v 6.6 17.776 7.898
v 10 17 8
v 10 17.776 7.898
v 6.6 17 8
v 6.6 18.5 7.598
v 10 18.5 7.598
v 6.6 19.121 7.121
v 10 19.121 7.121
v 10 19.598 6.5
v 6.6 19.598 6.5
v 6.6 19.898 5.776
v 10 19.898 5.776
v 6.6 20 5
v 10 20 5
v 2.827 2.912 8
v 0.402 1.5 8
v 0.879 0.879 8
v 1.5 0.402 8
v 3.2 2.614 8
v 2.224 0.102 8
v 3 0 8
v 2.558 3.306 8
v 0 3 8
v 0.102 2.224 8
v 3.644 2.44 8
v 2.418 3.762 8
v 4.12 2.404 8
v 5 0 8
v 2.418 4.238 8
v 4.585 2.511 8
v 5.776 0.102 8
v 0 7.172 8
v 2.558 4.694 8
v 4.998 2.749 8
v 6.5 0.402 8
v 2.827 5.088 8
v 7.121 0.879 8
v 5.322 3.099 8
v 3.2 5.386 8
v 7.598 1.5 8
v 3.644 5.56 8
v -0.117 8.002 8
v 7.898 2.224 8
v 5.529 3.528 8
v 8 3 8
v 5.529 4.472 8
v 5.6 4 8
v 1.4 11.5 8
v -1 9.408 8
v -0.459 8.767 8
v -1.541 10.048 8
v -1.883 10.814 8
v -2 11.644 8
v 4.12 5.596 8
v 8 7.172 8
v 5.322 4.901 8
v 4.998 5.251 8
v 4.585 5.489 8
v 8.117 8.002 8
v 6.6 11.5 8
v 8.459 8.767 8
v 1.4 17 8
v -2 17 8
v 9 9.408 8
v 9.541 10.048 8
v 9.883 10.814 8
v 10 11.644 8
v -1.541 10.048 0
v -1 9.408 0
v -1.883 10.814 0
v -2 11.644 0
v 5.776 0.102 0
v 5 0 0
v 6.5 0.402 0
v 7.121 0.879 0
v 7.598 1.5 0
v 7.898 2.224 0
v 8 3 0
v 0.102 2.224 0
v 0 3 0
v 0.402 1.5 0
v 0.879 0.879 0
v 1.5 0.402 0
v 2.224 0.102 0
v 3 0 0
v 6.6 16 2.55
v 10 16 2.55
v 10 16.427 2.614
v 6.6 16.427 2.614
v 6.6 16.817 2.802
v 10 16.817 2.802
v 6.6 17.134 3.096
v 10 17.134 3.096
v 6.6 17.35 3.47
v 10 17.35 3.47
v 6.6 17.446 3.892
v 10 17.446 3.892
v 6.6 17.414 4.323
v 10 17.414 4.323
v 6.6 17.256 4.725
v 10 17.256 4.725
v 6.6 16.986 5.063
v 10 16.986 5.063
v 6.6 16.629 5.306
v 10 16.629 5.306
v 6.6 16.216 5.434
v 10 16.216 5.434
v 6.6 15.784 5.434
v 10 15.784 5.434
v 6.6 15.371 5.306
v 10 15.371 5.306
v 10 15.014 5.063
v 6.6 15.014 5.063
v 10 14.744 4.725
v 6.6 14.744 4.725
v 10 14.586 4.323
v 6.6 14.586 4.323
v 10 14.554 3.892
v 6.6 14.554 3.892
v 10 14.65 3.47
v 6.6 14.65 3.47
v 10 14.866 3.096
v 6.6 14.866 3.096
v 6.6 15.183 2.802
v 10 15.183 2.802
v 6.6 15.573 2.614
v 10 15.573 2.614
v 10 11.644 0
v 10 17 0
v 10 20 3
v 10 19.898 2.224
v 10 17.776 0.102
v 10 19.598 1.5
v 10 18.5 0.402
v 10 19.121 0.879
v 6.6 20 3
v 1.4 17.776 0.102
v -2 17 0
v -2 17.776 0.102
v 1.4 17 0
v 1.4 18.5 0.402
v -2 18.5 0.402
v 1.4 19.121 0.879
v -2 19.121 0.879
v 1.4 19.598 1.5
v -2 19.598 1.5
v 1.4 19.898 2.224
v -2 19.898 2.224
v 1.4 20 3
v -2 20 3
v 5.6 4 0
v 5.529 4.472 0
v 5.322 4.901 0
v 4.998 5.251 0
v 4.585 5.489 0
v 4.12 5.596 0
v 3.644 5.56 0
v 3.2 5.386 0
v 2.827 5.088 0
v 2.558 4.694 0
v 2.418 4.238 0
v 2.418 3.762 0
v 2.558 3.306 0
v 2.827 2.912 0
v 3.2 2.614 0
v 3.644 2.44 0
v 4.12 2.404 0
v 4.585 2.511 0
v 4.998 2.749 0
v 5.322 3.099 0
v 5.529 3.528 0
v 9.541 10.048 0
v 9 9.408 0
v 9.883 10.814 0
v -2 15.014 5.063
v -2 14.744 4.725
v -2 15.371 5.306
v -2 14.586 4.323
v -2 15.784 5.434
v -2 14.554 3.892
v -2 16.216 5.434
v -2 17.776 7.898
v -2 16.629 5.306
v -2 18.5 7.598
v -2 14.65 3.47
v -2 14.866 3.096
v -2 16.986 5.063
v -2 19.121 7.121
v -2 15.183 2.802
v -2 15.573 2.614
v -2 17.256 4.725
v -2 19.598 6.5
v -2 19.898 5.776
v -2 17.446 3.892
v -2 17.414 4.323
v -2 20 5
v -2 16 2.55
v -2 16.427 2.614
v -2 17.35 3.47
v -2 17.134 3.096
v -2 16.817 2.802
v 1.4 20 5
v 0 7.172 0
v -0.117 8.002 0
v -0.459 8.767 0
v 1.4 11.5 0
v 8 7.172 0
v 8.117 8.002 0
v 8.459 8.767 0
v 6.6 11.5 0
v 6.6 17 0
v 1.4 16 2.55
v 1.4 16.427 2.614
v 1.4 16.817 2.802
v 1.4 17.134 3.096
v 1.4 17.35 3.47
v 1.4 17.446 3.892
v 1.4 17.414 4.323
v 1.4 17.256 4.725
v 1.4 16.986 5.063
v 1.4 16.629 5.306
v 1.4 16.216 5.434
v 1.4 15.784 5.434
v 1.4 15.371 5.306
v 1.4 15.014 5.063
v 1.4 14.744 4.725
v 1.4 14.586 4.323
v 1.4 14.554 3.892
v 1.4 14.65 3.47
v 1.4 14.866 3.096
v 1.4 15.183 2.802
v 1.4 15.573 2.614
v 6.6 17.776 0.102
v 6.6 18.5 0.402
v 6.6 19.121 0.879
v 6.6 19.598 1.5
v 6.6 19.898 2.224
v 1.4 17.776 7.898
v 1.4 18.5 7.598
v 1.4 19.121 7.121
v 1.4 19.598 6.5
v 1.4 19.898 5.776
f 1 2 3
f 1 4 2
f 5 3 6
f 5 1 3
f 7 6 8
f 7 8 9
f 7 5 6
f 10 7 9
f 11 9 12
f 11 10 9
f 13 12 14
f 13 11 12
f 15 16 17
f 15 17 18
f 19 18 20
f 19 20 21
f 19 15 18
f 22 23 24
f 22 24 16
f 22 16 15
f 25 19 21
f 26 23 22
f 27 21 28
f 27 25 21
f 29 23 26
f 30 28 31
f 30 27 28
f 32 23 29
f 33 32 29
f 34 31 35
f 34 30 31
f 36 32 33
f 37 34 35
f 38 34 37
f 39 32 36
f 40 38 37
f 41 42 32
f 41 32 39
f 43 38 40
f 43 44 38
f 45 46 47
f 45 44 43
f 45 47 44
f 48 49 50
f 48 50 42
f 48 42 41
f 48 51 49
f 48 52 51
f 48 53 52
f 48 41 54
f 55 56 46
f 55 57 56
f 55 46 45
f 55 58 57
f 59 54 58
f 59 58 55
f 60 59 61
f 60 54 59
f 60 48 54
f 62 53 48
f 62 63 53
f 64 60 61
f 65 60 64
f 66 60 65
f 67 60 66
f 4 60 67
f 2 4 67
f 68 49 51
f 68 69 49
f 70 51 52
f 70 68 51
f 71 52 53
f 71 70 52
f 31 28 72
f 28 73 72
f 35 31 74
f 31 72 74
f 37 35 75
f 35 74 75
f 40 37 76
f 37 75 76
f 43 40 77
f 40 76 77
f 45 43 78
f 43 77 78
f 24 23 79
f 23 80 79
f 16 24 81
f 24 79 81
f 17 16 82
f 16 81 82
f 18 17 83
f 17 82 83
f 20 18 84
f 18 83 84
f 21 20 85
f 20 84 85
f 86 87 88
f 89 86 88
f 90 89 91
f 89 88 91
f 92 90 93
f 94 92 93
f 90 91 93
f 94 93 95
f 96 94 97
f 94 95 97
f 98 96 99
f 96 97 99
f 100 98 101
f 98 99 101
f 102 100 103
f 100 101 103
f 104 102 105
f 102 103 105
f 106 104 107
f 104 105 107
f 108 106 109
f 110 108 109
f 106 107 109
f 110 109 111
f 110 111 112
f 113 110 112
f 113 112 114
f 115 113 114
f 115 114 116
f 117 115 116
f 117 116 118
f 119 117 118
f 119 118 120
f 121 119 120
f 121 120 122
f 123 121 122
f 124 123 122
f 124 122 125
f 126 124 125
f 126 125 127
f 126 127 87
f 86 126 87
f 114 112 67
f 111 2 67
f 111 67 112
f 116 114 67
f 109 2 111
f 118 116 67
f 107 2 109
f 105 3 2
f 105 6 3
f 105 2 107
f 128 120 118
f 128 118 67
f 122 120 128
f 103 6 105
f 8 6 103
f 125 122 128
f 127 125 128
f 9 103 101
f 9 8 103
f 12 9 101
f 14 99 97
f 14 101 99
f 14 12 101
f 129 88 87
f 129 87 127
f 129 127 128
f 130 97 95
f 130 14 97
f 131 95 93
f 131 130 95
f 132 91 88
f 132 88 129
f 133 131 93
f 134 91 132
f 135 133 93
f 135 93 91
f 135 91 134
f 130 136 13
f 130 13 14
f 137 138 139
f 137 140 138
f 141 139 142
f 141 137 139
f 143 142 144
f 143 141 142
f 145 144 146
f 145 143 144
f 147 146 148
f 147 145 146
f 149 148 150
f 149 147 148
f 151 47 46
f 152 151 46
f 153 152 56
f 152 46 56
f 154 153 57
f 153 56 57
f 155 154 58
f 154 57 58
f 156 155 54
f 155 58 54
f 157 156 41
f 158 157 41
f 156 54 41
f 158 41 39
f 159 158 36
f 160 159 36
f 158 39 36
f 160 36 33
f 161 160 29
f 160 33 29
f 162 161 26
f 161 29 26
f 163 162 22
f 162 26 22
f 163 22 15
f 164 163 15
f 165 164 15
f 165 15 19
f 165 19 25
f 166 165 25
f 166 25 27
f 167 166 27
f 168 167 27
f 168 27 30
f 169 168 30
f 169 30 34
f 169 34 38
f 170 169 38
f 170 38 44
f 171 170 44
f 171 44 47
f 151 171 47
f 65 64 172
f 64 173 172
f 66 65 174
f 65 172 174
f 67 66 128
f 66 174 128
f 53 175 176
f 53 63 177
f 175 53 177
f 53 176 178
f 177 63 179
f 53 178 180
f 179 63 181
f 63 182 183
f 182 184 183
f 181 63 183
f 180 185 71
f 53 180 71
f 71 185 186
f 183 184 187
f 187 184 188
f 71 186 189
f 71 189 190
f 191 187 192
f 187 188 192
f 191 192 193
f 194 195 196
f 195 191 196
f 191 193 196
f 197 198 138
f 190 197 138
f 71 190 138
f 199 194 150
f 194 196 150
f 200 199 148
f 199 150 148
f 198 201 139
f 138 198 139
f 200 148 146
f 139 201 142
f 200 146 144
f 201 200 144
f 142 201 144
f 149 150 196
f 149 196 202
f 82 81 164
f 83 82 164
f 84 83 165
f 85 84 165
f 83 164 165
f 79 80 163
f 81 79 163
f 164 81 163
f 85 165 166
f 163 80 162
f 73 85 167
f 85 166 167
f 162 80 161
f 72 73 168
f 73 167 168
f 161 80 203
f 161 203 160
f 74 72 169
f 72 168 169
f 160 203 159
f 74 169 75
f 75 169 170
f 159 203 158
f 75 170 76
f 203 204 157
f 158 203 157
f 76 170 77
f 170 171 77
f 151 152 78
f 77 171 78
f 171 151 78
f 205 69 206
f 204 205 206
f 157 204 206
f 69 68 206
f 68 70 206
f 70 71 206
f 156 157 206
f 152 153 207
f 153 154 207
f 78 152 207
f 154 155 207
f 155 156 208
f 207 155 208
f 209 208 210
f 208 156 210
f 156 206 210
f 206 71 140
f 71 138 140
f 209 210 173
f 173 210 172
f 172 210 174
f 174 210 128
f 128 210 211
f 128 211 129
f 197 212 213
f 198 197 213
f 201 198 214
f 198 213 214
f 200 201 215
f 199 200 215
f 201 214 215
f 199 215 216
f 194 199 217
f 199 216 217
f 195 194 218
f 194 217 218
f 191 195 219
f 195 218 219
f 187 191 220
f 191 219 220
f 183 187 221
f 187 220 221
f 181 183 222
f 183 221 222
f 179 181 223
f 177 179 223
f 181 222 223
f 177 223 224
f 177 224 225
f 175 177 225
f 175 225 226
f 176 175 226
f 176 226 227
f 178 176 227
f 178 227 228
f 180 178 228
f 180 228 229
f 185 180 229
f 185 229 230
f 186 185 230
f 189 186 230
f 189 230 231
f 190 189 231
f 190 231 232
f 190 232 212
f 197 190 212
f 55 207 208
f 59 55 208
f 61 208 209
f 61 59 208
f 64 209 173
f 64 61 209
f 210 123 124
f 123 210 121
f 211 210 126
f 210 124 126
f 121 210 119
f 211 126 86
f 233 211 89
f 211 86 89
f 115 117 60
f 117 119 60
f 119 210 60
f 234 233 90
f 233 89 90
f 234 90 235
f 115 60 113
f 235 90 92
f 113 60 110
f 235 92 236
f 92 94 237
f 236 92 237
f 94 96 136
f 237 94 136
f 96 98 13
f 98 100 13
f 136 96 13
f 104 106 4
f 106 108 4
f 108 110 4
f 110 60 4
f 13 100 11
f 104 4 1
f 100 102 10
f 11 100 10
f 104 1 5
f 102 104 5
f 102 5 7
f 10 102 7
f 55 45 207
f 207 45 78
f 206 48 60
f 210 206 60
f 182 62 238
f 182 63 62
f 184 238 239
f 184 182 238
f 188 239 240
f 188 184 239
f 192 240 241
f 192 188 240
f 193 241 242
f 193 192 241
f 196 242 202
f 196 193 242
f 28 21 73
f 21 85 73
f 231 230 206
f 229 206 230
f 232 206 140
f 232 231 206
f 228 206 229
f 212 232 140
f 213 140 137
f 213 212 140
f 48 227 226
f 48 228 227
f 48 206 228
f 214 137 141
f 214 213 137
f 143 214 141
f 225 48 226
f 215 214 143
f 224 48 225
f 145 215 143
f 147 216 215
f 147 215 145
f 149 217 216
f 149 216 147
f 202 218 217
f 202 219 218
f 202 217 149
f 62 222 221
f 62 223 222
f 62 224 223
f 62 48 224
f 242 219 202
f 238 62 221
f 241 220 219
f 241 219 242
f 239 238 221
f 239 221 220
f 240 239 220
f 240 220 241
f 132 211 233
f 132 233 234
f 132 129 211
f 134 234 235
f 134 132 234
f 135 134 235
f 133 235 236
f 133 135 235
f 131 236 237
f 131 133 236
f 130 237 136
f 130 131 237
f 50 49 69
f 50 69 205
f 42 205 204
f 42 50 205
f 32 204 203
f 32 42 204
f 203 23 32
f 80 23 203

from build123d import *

# Parameters (mm, degrees)
SKETCH_1_W          = 8
SKETCH_1_H          = 8
EXTRUDE_1_DEPTH     = 20
SKETCH_2_R          = 1.6
CUT_EXTRUDE_1_DEPTH = 23.978250586
SKETCH_4_W          = 2
SKETCH_4_H          = 8
EXTRUDE_3_DEPTH     = 10
SKETCH_5_W          = 5.2
SKETCH_5_H          = 8.5
CUT_EXTRUDE_2_DEPTH = 24.748684174
FILLET_1_R          = 3
SKETCH_6_R          = 1.45
CUT_EXTRUDE_3_DEPTH = 25.657656012
FILLET_2_R          = 3


with BuildPart() as part:
    # 草图1 → 凸台-拉伸1 (new body)
    with BuildSketch(Plane(origin=(0, 0, 0), x_dir=(1, 0, 0), z_dir=(0, 1, 0))):
        with Locations((4, -4)):
            Rectangle(SKETCH_1_W, SKETCH_1_H)
    extrude(amount=EXTRUDE_1_DEPTH)

    # 草图2 → 切除-拉伸1 (cut, through all)
    with BuildSketch(Plane.XY.offset(8)):
        with Locations((4, 4)):
            Circle(SKETCH_2_R)
    extrude(amount=-CUT_EXTRUDE_1_DEPTH, mode=Mode.SUBTRACT)

    # 草图4 → 凸台-拉伸3 (add)
    with BuildSketch(Plane(origin=(0, 20, 0), x_dir=(1, 0, 0), z_dir=(0, 1, 0))):
        with Locations((-1, -4)):
            Rectangle(SKETCH_4_W, SKETCH_4_H)
        with Locations((9, -4)):
            Rectangle(SKETCH_4_W, SKETCH_4_H)
    extrude(amount=-EXTRUDE_3_DEPTH)

    # 草图5 → 切除-拉伸2 (cut, through all)
    with BuildSketch(Plane.XY.offset(8)):
        with Locations((4, 15.75)):
            Rectangle(SKETCH_5_W, SKETCH_5_H)
    extrude(amount=-CUT_EXTRUDE_2_DEPTH, mode=Mode.SUBTRACT)

    # 圆角1
    # the kernel refuses this fillet: 3 mm, written as the material it adds along each edge
    with BuildSketch(Plane(origin=(8, 10, 8), x_dir=(0, -1, 0), z_dir=(0, 0, -1))) as fillet_1_piece_1:
        with BuildLine():
            CenterArc((2.828427125, -3), FILLET_1_R, 90, 70.528779366)
            Line((0, -2), (-0.056568542, -1.98))
            ThreePointArc((-0.056568542, -1.98), (-0.06, -1), (-0.06, 0))
            Line((-0.06, 0), (0, 0.06))
            Line((0, 0.06), (2.828427125, 0.06))
            Line((2.828427125, 0.06), (2.828427125, 0))
        make_face()
    extrude(amount=8)
    with BuildSketch(Plane(origin=(0, 10, 8), x_dir=(-1, 0, 0), z_dir=(0, 0, -1))) as fillet_1_piece_2:
        with BuildLine():
            CenterArc((3, -2.828427125), FILLET_1_R, 109.471220634, 70.528779366)
            Line((0, -2.828427125), (-0.06, -2.828427125))
            Line((-0.06, -2.828427125), (-0.06, 0))
            Line((-0.06, 0), (0, 0.06))
            ThreePointArc((0, 0.06), (1, 0.06), (1.98, 0.056568542))
            Line((1.98, 0.056568542), (2, 0))
        make_face()
    extrude(amount=8)

    # 草图6 → 切除-拉伸3 (cut, through all)
    with BuildSketch(Plane(origin=(10, 0, 0), x_dir=(0, 0, -1), z_dir=(1, 0, 0))):
        with Locations((-4, 16)):
            Circle(SKETCH_6_R)
    extrude(amount=-CUT_EXTRUDE_3_DEPTH, mode=Mode.SUBTRACT)

    # 圆角2
    fillet_2_edges = [part.edges().sort_by_distance(p)[0] for p in [
        (8.3, 20, 0),
        (-2, 10, 4),
        (10, 10, 4),
        (-0.3, 20, 0),
        (8.3, 20, 8),
        (8, 0, 4),
        (0, 0, 4),
        (-0.3, 20, 8),
    ]]
    fillet(fillet_2_edges, radius=FILLET_2_R)


solid = part.part
